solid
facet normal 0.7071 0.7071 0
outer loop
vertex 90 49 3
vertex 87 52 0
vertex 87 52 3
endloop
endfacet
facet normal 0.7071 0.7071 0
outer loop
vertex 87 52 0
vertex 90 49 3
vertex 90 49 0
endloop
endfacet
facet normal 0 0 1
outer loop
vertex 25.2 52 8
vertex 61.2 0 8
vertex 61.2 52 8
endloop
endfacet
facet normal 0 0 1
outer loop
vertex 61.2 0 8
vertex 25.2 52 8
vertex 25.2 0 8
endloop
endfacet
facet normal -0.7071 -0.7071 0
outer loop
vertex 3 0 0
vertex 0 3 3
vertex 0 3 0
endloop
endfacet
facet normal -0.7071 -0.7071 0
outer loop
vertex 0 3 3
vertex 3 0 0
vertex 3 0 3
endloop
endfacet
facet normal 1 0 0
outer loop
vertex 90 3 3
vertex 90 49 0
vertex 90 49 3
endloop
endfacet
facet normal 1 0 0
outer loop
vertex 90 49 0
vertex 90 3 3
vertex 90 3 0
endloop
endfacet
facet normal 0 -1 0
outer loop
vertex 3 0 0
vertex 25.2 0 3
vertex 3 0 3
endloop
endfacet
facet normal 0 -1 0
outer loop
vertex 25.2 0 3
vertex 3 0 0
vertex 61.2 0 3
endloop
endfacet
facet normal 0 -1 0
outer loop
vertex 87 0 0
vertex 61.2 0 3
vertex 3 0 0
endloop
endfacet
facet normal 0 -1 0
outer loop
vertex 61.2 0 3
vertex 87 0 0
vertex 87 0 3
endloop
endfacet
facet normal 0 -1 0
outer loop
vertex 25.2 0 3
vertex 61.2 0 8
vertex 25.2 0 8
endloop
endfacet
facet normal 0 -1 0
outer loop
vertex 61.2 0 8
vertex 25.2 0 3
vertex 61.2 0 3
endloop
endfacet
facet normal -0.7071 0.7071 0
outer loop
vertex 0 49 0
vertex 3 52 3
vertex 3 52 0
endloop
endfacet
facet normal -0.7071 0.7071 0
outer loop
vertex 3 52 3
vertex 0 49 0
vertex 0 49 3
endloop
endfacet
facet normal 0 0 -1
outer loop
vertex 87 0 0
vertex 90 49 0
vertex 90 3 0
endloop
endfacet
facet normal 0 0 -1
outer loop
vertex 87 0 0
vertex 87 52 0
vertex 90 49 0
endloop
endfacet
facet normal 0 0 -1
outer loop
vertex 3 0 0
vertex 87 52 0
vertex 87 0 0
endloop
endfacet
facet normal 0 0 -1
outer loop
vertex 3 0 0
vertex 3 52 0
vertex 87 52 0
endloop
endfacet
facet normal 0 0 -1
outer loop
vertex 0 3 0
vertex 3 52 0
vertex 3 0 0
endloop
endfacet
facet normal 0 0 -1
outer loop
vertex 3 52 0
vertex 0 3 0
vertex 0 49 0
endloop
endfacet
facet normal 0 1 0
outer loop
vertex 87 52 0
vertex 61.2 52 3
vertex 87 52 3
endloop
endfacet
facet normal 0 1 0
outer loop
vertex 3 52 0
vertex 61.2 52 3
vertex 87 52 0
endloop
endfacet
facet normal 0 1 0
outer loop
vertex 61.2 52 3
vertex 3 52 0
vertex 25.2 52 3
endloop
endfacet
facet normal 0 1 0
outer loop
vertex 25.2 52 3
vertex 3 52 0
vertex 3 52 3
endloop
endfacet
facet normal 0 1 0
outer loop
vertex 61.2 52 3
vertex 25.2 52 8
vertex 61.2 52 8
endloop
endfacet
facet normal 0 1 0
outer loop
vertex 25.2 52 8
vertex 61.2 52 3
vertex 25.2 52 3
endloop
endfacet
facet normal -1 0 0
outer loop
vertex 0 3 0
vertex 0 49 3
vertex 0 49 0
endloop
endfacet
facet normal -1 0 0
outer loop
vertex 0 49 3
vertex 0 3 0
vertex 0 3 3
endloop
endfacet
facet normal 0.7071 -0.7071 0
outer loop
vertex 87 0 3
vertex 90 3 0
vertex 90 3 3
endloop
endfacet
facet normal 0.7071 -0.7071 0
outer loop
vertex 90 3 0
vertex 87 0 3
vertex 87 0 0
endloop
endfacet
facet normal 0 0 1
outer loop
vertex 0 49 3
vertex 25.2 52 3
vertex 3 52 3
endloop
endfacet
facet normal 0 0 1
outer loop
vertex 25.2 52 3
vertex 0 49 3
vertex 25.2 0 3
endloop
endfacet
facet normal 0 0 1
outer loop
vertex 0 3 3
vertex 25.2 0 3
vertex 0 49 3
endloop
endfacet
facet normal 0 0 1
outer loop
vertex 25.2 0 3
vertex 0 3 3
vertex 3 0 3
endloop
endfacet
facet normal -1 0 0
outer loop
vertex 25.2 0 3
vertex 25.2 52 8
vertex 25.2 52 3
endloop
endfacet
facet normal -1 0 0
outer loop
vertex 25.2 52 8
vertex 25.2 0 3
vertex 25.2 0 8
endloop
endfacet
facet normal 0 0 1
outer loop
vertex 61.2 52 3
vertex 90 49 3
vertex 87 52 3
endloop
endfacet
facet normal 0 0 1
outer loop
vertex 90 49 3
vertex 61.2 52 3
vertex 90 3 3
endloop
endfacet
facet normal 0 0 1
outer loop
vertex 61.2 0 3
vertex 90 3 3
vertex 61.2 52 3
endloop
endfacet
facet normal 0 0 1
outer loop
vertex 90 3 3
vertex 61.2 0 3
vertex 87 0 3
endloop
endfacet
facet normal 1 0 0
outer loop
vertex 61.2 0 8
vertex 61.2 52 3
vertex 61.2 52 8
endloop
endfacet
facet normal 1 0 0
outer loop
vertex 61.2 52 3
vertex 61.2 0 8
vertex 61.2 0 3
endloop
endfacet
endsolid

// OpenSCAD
$fn = 32;

// ----------------------------------------------------------------------
// Stepped bar: centerstep, 90 x 52 x 8/3 mm
// ----------------------------------------------------------------------

// --- parameters (mm) ---
bar_l = 90;               // bar length, X
bar_w = 52;               // bar width, Y
plate_t = 8;              // thickness of the thick zone, Z
thin_t = 3;               // thickness of the thin zone
corner_c = 3;             // corner chamfer of the bar
step_cut = 5;             // material removed from the thin zone
thick_from = 25.2;        // start of the thick middle zone
thick_to = 61.2;          // end of the thick middle zone
depth_1 = 5;              // depth of cut 1 from the top face
depth_2 = 5;              // depth of cut 2 from the top face
fit_tol = 0.05;           // declared fit tolerance (prompt contract)
free_tol = 0.2;           // declared free tolerance (prompt contract)

profile = [[3, 0], [87, 0], [90, 3], [90, 49], [87, 52], [3, 52], [0, 49], [0, 3]];  // primary outline, 8 points, counter clockwise
void_1 = [[-1, -1], [25.2, -1], [25.2, 53], [-1, 53]];  // thin left end, 4 points
void_2 = [[61.2, -1], [91, -1], [91, 53], [61.2, 53]];  // thin right end, 4 points

// --- the one profile operation ---
difference() {
  linear_extrude(height = plate_t) polygon(points = profile);
  translate([0, 0, plate_t - depth_1])
    linear_extrude(height = depth_1 + 1) polygon(points = void_1);
  translate([0, 0, plate_t - depth_2])
    linear_extrude(height = depth_2 + 1) polygon(points = void_2);
}
